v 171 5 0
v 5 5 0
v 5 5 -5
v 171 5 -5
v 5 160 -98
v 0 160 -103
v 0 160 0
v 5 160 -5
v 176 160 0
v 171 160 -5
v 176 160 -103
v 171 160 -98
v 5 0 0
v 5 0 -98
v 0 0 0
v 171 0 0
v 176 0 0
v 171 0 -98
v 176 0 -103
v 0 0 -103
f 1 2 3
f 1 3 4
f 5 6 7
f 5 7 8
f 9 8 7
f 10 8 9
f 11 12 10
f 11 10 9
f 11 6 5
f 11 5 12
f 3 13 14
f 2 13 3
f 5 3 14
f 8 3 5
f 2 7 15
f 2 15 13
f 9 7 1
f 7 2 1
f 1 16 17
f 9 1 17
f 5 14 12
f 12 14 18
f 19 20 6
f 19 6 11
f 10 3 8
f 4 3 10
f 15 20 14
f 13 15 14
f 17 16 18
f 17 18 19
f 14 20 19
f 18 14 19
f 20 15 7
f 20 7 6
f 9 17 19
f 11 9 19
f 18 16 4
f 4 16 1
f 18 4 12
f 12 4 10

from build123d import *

# Parameters (mm, degrees)
SKETCH1_W           = 176
SKETCH1_H           = 103
SKETCH1_W_2         = 166
SKETCH1_H_2         = 93
BOSS_EXTRUDE1_DEPTH = 160
CUT_EXTRUDE1_REACH  = 261.201
SKETCH2_W           = 166
SKETCH2_H           = 5


with BuildPart() as part:
    # Sketch1 → Boss-Extrude1 (new body)
    with BuildSketch(Plane(origin=(0, 0, 0), x_dir=(1, 0, 0), z_dir=(0, 1, 0))):
        with Locations((88, 51.5)):
            Rectangle(SKETCH1_W, SKETCH1_H)
        with Locations((88, 51.5)):
            Rectangle(SKETCH1_W_2, SKETCH1_H_2, mode=Mode.SUBTRACT)
    extrude(amount=BOSS_EXTRUDE1_DEPTH)

    # Sketch2 → Cut-Extrude1 (cut, up to next)
    with BuildSketch(Plane.XY, mode=Mode.PRIVATE) as cut_extrude1_sk1:
        with Locations((88, 2.5)):
            Rectangle(SKETCH2_W, SKETCH2_H)
    cut_extrude1_tool1 = extrude(cut_extrude1_sk1.sketch, amount=-CUT_EXTRUDE1_REACH, mode=Mode.PRIVATE) & part.part
    add(cut_extrude1_tool1.solids().sort_by_distance((88, 2.5, 0))[0], mode=Mode.SUBTRACT)


solid = part.part
